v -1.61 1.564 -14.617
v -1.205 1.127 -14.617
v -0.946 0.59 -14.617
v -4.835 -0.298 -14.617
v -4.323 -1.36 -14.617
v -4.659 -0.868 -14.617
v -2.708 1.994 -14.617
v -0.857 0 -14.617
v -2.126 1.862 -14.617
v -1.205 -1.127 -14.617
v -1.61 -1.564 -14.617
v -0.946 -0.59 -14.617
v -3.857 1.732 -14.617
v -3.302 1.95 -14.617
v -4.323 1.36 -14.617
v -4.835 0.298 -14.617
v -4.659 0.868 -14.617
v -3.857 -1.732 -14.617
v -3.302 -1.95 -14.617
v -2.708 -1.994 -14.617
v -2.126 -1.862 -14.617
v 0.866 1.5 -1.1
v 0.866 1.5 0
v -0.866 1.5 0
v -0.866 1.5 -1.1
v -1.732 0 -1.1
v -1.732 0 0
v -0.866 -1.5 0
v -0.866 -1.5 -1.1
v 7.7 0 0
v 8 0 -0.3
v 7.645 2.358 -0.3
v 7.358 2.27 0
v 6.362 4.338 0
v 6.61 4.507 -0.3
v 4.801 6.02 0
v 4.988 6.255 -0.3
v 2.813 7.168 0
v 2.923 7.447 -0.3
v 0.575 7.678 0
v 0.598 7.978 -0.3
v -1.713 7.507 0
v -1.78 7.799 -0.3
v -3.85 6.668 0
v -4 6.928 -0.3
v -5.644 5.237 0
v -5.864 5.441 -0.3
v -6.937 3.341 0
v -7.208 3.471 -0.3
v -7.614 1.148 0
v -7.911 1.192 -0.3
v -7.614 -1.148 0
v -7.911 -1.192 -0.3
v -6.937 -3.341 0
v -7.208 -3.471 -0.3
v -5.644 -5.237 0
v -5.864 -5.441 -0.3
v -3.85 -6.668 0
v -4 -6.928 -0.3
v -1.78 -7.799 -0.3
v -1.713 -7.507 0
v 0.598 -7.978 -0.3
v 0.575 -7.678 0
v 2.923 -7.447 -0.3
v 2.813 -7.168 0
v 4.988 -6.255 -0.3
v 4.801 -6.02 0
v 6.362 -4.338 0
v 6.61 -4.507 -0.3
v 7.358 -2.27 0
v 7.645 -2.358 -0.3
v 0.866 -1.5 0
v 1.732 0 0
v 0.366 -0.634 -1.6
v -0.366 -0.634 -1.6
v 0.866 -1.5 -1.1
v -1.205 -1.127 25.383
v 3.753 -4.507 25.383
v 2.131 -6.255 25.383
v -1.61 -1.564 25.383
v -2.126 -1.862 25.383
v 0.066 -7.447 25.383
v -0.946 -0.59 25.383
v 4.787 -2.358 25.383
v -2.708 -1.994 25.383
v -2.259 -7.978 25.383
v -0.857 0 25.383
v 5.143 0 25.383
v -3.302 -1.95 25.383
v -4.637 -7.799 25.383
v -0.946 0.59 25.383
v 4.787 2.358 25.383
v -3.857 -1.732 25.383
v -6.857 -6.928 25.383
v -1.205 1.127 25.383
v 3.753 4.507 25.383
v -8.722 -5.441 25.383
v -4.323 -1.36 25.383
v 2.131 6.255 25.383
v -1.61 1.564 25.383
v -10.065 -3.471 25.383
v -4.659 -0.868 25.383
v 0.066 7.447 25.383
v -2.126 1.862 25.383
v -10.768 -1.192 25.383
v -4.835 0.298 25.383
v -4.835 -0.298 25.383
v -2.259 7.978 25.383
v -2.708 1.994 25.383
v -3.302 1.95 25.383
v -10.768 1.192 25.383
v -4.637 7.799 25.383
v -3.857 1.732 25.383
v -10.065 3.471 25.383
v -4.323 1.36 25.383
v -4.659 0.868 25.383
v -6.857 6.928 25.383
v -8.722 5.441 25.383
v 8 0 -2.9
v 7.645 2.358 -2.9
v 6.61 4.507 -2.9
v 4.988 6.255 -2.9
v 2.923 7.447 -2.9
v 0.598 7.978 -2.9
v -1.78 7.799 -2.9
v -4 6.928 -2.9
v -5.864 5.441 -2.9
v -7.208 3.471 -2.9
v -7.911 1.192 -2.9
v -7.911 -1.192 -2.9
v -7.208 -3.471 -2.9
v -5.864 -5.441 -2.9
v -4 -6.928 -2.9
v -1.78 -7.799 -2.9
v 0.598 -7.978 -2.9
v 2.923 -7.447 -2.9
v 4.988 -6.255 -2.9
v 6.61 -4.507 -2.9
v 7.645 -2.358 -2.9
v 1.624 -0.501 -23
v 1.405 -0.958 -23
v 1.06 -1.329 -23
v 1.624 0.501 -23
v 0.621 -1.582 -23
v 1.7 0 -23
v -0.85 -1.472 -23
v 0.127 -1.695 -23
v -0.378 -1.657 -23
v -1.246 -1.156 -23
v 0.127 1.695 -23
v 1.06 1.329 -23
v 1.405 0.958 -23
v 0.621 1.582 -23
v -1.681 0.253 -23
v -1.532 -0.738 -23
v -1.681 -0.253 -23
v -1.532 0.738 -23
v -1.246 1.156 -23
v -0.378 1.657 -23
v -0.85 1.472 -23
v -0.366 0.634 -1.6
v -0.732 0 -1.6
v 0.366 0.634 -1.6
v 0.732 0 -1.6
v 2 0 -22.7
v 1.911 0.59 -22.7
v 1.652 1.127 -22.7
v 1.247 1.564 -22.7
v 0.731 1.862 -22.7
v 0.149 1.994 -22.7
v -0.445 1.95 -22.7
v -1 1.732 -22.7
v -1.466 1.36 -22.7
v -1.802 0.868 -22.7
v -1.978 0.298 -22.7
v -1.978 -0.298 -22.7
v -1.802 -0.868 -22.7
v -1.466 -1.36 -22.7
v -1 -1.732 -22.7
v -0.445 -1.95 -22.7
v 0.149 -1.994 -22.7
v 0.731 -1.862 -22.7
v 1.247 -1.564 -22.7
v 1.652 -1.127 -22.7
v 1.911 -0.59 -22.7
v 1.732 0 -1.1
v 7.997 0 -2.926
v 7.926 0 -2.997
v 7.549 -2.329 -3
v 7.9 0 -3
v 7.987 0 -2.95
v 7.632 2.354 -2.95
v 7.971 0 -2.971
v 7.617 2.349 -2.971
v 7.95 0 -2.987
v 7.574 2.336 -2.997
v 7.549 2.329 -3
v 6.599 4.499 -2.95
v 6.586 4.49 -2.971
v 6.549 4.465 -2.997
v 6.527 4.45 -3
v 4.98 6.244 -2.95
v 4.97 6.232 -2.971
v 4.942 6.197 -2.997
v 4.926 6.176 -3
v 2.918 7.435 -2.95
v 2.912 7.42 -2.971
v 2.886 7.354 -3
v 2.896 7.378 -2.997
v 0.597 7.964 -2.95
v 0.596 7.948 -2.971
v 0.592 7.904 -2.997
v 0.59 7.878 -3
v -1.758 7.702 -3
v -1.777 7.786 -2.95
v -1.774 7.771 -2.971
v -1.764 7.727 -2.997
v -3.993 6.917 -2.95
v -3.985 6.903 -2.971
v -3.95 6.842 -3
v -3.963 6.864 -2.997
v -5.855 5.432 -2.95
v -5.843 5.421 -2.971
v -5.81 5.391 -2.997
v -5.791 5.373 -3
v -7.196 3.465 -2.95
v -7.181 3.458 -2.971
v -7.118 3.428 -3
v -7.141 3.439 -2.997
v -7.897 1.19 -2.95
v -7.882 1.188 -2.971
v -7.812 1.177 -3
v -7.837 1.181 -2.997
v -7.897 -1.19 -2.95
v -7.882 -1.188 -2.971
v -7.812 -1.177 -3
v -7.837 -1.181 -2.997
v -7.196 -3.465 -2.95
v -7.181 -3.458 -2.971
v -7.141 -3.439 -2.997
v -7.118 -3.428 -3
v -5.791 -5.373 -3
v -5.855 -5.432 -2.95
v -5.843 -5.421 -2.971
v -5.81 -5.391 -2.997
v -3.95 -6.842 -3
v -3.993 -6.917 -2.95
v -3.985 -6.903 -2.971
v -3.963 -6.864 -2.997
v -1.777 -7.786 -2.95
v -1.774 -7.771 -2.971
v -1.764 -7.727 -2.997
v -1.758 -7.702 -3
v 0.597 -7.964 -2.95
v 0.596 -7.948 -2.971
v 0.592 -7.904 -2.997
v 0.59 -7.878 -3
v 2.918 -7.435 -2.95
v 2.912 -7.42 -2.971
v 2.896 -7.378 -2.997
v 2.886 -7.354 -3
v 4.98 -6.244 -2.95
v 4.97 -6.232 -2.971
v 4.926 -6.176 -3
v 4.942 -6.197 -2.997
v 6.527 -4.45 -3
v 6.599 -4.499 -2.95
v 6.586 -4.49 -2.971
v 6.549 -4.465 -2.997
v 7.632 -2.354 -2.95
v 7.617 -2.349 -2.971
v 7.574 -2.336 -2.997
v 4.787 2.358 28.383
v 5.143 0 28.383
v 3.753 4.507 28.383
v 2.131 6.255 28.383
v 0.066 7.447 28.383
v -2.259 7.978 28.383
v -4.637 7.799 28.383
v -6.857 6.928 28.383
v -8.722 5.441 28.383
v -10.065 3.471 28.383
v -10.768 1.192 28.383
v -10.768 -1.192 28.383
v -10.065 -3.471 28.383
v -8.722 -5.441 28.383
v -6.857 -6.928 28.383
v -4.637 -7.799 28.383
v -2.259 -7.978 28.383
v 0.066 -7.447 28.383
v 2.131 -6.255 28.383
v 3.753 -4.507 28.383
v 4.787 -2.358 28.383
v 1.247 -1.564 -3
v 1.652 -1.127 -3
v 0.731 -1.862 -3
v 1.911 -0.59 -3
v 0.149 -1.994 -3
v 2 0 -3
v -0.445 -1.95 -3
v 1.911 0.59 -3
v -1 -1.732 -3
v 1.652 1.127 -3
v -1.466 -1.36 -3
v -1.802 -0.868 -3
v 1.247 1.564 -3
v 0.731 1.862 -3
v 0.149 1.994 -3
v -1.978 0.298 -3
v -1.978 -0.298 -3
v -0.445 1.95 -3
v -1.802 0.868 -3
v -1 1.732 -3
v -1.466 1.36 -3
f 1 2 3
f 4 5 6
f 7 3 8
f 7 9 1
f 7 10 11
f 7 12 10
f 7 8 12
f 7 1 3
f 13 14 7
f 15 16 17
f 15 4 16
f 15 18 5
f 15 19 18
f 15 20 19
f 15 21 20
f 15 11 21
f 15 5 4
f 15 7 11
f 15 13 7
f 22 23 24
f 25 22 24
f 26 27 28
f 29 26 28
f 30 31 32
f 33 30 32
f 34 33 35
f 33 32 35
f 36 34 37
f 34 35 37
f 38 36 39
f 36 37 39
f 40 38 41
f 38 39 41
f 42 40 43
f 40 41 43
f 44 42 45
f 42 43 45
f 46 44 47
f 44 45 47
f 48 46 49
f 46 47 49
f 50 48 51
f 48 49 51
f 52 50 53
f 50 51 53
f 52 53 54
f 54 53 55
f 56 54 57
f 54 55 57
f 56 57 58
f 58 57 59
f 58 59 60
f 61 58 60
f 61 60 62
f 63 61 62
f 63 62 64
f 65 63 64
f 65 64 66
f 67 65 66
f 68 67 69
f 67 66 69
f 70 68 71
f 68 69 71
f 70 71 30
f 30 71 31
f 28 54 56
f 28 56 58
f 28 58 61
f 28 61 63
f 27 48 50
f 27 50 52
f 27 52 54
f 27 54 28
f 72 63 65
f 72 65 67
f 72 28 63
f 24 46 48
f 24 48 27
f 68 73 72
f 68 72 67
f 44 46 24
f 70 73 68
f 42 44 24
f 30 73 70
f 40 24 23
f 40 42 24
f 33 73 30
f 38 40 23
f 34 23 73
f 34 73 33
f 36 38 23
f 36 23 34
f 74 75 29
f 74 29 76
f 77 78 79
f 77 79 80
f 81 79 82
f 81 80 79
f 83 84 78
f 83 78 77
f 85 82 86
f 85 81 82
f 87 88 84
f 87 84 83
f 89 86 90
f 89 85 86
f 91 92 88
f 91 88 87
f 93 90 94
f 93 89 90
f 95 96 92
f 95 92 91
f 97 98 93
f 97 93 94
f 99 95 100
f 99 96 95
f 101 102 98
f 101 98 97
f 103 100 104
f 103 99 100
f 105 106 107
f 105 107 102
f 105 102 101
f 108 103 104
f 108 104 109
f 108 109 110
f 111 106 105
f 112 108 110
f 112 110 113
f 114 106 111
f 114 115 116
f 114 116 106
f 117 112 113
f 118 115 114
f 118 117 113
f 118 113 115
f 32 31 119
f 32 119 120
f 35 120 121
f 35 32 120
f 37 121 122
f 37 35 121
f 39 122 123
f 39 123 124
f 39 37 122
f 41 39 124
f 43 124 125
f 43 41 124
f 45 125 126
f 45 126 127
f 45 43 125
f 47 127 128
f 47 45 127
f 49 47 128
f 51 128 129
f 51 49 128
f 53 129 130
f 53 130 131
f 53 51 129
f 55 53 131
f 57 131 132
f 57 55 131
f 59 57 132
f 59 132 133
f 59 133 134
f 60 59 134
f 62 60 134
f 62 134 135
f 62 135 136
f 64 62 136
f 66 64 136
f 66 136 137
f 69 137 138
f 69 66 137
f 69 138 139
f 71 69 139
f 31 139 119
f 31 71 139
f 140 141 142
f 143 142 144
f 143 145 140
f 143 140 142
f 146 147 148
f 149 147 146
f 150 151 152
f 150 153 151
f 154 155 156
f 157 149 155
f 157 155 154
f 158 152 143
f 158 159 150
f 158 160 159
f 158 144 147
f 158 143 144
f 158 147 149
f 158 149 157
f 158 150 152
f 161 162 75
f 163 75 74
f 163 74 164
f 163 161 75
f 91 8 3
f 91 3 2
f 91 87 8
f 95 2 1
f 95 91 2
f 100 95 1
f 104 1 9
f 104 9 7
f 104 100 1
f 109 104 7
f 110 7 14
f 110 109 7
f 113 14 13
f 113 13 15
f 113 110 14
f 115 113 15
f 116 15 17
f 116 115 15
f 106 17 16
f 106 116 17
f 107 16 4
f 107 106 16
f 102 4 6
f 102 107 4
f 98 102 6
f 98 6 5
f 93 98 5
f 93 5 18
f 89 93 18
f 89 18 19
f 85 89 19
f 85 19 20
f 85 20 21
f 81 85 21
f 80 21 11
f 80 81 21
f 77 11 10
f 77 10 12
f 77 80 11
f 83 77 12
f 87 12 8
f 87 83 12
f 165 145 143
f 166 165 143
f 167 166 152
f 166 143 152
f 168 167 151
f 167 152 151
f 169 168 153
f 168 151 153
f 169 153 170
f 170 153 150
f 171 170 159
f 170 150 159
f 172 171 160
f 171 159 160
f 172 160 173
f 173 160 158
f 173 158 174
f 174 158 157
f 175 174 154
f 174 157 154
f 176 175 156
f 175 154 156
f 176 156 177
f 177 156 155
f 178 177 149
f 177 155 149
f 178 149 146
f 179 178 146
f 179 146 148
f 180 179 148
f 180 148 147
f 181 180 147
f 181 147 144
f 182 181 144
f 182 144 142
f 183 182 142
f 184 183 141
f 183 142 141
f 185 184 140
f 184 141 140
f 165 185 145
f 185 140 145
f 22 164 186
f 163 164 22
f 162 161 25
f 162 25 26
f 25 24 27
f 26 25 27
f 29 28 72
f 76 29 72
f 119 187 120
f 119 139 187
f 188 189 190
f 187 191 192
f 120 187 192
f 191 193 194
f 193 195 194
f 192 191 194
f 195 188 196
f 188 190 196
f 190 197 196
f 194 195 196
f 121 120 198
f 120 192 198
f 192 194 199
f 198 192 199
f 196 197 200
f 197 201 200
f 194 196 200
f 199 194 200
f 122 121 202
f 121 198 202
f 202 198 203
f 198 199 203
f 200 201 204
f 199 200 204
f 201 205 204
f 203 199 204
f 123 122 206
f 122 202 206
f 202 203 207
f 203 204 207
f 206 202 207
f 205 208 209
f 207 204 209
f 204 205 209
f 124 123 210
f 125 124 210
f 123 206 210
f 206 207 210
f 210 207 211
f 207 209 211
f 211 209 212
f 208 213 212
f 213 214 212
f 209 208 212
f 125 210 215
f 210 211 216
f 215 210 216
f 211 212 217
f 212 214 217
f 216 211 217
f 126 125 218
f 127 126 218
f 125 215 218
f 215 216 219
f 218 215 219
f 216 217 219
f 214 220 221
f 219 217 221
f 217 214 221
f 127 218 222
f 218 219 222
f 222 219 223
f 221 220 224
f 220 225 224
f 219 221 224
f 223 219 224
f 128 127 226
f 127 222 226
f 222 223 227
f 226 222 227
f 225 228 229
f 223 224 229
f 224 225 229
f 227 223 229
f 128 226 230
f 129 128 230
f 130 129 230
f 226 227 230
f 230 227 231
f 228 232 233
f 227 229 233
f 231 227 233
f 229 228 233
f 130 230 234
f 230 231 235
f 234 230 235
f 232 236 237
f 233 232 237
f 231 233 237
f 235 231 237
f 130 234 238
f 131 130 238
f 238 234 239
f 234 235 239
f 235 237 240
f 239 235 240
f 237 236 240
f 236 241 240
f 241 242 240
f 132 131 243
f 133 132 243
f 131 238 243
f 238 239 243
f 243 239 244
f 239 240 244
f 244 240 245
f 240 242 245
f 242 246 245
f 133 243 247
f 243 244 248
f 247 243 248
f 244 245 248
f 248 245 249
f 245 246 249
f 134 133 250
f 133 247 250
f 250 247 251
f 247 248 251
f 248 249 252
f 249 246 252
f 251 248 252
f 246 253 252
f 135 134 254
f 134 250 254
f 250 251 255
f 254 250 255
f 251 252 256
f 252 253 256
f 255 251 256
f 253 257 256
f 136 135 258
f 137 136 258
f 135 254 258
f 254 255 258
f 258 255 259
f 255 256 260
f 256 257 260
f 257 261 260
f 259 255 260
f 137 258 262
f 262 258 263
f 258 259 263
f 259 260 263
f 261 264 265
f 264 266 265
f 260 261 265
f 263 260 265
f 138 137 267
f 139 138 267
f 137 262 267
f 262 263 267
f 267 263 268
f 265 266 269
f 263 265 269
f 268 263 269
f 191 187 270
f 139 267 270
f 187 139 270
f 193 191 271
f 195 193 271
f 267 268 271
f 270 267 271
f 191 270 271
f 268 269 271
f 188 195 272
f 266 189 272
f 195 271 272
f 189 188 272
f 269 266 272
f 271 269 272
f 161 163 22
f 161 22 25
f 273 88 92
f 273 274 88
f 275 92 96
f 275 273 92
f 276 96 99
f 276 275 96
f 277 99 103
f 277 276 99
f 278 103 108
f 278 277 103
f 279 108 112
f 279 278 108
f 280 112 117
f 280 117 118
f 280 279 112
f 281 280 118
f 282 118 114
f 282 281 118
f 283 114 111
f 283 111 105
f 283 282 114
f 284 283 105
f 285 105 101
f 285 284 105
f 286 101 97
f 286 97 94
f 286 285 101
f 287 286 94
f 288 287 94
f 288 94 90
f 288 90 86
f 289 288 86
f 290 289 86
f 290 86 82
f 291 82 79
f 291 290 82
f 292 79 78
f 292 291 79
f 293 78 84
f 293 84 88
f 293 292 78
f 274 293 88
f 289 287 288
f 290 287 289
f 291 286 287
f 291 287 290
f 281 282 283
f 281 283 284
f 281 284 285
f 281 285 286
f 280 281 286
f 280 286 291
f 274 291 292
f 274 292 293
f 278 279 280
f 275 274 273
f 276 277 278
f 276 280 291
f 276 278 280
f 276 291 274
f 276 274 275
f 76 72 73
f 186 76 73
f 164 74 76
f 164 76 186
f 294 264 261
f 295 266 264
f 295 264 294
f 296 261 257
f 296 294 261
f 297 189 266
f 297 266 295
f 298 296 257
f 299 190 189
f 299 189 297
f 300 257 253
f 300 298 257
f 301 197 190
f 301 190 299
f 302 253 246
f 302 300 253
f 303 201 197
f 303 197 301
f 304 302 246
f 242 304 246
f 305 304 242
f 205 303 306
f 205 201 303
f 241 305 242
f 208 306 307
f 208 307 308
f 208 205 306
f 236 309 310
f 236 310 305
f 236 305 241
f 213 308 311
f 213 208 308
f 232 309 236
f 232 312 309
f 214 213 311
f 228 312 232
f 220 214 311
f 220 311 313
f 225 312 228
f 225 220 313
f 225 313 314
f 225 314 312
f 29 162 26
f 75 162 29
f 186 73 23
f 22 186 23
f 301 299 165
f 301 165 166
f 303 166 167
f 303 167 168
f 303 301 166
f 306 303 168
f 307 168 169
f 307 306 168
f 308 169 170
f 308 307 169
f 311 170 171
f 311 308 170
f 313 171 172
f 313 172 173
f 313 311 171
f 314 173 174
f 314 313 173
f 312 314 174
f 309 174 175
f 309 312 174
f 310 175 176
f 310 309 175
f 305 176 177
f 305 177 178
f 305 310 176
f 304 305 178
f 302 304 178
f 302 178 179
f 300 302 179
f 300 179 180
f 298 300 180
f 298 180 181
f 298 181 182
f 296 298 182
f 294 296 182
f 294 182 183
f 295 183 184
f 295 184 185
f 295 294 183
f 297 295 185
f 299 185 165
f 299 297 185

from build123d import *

# Parameters (mm, degrees)
F3_DEPTH = 1.6
F4_SIZE2 = 0.8660254038
F4_SIZE  = 0.5
F5_SIZE  = 0.3
F6_R     = 0.1


with BuildPart() as f1:
    # F0 (on Front) → F1 (revolve)
    with BuildSketch(Plane.XZ):
        Polygon((8, 0), (0, 0), (0, -23), (2, -23), (2, -3), (8, -3), align=None)
    revolve(axis=Axis((0, 0, -11.5), (0, 0, 1)))

    # F2 (on face) → F3 (cut)
    with BuildSketch(Plane.XY):
        Polygon((0.8660254038, 1.5), (-0.8660254038, 1.5), (-1.7320508076, 0), (-0.8660254038, -1.5), (0.8660254038, -1.5), (1.7320508076, 0), align=None)
    extrude(amount=-F3_DEPTH, mode=Mode.SUBTRACT)

    # F4
    f4_edges = [f1.edges().sort_by_distance(p)[0] for p in [
        (0, 1.5, -1.6),
        (-1.299038, 0.75, -1.6),
        (-1.299038, -0.75, -1.6),
        (0, -1.5, -1.6),
        (1.299038, -0.75, -1.6),
        (1.299038, 0.75, -1.6),
    ]]
    chamfer(f4_edges, length=F4_SIZE, length2=F4_SIZE2)

    # F5
    f5_edges = [f1.edges().sort_by_distance(p)[0] for p in [
        (-8, 0, 0),
        (-2, 0, -23),
    ]]
    chamfer(f5_edges, length=F5_SIZE)

    # F6
    f6_edges = [f1.edges().sort_by_distance(p)[0] for p in [
        (-8, 0, -3),
    ]]
    fillet(f6_edges, radius=F6_R)


with BuildPart() as f7_1:
    # F7: copy of F1
    add(f1.part)


with BuildPart() as f10:
    # F9 (on Front) → F10 (revolve)
    with BuildSketch(Plane.XZ):
        Polygon((5.1428571429, 28.3832729334), (-2.8571428571, 28.3832729334), (-2.8571428571, -14.6167270666), (-0.8571428571, -14.6167270666), (-0.8571428571, 25.3832729334), (5.1428571429, 25.3832729334), align=None)
    revolve(axis=Axis((-2.8571428571, 0, 6.8832729334), (0, 0, 1)))


solid = Compound([f1.part, f10.part])
